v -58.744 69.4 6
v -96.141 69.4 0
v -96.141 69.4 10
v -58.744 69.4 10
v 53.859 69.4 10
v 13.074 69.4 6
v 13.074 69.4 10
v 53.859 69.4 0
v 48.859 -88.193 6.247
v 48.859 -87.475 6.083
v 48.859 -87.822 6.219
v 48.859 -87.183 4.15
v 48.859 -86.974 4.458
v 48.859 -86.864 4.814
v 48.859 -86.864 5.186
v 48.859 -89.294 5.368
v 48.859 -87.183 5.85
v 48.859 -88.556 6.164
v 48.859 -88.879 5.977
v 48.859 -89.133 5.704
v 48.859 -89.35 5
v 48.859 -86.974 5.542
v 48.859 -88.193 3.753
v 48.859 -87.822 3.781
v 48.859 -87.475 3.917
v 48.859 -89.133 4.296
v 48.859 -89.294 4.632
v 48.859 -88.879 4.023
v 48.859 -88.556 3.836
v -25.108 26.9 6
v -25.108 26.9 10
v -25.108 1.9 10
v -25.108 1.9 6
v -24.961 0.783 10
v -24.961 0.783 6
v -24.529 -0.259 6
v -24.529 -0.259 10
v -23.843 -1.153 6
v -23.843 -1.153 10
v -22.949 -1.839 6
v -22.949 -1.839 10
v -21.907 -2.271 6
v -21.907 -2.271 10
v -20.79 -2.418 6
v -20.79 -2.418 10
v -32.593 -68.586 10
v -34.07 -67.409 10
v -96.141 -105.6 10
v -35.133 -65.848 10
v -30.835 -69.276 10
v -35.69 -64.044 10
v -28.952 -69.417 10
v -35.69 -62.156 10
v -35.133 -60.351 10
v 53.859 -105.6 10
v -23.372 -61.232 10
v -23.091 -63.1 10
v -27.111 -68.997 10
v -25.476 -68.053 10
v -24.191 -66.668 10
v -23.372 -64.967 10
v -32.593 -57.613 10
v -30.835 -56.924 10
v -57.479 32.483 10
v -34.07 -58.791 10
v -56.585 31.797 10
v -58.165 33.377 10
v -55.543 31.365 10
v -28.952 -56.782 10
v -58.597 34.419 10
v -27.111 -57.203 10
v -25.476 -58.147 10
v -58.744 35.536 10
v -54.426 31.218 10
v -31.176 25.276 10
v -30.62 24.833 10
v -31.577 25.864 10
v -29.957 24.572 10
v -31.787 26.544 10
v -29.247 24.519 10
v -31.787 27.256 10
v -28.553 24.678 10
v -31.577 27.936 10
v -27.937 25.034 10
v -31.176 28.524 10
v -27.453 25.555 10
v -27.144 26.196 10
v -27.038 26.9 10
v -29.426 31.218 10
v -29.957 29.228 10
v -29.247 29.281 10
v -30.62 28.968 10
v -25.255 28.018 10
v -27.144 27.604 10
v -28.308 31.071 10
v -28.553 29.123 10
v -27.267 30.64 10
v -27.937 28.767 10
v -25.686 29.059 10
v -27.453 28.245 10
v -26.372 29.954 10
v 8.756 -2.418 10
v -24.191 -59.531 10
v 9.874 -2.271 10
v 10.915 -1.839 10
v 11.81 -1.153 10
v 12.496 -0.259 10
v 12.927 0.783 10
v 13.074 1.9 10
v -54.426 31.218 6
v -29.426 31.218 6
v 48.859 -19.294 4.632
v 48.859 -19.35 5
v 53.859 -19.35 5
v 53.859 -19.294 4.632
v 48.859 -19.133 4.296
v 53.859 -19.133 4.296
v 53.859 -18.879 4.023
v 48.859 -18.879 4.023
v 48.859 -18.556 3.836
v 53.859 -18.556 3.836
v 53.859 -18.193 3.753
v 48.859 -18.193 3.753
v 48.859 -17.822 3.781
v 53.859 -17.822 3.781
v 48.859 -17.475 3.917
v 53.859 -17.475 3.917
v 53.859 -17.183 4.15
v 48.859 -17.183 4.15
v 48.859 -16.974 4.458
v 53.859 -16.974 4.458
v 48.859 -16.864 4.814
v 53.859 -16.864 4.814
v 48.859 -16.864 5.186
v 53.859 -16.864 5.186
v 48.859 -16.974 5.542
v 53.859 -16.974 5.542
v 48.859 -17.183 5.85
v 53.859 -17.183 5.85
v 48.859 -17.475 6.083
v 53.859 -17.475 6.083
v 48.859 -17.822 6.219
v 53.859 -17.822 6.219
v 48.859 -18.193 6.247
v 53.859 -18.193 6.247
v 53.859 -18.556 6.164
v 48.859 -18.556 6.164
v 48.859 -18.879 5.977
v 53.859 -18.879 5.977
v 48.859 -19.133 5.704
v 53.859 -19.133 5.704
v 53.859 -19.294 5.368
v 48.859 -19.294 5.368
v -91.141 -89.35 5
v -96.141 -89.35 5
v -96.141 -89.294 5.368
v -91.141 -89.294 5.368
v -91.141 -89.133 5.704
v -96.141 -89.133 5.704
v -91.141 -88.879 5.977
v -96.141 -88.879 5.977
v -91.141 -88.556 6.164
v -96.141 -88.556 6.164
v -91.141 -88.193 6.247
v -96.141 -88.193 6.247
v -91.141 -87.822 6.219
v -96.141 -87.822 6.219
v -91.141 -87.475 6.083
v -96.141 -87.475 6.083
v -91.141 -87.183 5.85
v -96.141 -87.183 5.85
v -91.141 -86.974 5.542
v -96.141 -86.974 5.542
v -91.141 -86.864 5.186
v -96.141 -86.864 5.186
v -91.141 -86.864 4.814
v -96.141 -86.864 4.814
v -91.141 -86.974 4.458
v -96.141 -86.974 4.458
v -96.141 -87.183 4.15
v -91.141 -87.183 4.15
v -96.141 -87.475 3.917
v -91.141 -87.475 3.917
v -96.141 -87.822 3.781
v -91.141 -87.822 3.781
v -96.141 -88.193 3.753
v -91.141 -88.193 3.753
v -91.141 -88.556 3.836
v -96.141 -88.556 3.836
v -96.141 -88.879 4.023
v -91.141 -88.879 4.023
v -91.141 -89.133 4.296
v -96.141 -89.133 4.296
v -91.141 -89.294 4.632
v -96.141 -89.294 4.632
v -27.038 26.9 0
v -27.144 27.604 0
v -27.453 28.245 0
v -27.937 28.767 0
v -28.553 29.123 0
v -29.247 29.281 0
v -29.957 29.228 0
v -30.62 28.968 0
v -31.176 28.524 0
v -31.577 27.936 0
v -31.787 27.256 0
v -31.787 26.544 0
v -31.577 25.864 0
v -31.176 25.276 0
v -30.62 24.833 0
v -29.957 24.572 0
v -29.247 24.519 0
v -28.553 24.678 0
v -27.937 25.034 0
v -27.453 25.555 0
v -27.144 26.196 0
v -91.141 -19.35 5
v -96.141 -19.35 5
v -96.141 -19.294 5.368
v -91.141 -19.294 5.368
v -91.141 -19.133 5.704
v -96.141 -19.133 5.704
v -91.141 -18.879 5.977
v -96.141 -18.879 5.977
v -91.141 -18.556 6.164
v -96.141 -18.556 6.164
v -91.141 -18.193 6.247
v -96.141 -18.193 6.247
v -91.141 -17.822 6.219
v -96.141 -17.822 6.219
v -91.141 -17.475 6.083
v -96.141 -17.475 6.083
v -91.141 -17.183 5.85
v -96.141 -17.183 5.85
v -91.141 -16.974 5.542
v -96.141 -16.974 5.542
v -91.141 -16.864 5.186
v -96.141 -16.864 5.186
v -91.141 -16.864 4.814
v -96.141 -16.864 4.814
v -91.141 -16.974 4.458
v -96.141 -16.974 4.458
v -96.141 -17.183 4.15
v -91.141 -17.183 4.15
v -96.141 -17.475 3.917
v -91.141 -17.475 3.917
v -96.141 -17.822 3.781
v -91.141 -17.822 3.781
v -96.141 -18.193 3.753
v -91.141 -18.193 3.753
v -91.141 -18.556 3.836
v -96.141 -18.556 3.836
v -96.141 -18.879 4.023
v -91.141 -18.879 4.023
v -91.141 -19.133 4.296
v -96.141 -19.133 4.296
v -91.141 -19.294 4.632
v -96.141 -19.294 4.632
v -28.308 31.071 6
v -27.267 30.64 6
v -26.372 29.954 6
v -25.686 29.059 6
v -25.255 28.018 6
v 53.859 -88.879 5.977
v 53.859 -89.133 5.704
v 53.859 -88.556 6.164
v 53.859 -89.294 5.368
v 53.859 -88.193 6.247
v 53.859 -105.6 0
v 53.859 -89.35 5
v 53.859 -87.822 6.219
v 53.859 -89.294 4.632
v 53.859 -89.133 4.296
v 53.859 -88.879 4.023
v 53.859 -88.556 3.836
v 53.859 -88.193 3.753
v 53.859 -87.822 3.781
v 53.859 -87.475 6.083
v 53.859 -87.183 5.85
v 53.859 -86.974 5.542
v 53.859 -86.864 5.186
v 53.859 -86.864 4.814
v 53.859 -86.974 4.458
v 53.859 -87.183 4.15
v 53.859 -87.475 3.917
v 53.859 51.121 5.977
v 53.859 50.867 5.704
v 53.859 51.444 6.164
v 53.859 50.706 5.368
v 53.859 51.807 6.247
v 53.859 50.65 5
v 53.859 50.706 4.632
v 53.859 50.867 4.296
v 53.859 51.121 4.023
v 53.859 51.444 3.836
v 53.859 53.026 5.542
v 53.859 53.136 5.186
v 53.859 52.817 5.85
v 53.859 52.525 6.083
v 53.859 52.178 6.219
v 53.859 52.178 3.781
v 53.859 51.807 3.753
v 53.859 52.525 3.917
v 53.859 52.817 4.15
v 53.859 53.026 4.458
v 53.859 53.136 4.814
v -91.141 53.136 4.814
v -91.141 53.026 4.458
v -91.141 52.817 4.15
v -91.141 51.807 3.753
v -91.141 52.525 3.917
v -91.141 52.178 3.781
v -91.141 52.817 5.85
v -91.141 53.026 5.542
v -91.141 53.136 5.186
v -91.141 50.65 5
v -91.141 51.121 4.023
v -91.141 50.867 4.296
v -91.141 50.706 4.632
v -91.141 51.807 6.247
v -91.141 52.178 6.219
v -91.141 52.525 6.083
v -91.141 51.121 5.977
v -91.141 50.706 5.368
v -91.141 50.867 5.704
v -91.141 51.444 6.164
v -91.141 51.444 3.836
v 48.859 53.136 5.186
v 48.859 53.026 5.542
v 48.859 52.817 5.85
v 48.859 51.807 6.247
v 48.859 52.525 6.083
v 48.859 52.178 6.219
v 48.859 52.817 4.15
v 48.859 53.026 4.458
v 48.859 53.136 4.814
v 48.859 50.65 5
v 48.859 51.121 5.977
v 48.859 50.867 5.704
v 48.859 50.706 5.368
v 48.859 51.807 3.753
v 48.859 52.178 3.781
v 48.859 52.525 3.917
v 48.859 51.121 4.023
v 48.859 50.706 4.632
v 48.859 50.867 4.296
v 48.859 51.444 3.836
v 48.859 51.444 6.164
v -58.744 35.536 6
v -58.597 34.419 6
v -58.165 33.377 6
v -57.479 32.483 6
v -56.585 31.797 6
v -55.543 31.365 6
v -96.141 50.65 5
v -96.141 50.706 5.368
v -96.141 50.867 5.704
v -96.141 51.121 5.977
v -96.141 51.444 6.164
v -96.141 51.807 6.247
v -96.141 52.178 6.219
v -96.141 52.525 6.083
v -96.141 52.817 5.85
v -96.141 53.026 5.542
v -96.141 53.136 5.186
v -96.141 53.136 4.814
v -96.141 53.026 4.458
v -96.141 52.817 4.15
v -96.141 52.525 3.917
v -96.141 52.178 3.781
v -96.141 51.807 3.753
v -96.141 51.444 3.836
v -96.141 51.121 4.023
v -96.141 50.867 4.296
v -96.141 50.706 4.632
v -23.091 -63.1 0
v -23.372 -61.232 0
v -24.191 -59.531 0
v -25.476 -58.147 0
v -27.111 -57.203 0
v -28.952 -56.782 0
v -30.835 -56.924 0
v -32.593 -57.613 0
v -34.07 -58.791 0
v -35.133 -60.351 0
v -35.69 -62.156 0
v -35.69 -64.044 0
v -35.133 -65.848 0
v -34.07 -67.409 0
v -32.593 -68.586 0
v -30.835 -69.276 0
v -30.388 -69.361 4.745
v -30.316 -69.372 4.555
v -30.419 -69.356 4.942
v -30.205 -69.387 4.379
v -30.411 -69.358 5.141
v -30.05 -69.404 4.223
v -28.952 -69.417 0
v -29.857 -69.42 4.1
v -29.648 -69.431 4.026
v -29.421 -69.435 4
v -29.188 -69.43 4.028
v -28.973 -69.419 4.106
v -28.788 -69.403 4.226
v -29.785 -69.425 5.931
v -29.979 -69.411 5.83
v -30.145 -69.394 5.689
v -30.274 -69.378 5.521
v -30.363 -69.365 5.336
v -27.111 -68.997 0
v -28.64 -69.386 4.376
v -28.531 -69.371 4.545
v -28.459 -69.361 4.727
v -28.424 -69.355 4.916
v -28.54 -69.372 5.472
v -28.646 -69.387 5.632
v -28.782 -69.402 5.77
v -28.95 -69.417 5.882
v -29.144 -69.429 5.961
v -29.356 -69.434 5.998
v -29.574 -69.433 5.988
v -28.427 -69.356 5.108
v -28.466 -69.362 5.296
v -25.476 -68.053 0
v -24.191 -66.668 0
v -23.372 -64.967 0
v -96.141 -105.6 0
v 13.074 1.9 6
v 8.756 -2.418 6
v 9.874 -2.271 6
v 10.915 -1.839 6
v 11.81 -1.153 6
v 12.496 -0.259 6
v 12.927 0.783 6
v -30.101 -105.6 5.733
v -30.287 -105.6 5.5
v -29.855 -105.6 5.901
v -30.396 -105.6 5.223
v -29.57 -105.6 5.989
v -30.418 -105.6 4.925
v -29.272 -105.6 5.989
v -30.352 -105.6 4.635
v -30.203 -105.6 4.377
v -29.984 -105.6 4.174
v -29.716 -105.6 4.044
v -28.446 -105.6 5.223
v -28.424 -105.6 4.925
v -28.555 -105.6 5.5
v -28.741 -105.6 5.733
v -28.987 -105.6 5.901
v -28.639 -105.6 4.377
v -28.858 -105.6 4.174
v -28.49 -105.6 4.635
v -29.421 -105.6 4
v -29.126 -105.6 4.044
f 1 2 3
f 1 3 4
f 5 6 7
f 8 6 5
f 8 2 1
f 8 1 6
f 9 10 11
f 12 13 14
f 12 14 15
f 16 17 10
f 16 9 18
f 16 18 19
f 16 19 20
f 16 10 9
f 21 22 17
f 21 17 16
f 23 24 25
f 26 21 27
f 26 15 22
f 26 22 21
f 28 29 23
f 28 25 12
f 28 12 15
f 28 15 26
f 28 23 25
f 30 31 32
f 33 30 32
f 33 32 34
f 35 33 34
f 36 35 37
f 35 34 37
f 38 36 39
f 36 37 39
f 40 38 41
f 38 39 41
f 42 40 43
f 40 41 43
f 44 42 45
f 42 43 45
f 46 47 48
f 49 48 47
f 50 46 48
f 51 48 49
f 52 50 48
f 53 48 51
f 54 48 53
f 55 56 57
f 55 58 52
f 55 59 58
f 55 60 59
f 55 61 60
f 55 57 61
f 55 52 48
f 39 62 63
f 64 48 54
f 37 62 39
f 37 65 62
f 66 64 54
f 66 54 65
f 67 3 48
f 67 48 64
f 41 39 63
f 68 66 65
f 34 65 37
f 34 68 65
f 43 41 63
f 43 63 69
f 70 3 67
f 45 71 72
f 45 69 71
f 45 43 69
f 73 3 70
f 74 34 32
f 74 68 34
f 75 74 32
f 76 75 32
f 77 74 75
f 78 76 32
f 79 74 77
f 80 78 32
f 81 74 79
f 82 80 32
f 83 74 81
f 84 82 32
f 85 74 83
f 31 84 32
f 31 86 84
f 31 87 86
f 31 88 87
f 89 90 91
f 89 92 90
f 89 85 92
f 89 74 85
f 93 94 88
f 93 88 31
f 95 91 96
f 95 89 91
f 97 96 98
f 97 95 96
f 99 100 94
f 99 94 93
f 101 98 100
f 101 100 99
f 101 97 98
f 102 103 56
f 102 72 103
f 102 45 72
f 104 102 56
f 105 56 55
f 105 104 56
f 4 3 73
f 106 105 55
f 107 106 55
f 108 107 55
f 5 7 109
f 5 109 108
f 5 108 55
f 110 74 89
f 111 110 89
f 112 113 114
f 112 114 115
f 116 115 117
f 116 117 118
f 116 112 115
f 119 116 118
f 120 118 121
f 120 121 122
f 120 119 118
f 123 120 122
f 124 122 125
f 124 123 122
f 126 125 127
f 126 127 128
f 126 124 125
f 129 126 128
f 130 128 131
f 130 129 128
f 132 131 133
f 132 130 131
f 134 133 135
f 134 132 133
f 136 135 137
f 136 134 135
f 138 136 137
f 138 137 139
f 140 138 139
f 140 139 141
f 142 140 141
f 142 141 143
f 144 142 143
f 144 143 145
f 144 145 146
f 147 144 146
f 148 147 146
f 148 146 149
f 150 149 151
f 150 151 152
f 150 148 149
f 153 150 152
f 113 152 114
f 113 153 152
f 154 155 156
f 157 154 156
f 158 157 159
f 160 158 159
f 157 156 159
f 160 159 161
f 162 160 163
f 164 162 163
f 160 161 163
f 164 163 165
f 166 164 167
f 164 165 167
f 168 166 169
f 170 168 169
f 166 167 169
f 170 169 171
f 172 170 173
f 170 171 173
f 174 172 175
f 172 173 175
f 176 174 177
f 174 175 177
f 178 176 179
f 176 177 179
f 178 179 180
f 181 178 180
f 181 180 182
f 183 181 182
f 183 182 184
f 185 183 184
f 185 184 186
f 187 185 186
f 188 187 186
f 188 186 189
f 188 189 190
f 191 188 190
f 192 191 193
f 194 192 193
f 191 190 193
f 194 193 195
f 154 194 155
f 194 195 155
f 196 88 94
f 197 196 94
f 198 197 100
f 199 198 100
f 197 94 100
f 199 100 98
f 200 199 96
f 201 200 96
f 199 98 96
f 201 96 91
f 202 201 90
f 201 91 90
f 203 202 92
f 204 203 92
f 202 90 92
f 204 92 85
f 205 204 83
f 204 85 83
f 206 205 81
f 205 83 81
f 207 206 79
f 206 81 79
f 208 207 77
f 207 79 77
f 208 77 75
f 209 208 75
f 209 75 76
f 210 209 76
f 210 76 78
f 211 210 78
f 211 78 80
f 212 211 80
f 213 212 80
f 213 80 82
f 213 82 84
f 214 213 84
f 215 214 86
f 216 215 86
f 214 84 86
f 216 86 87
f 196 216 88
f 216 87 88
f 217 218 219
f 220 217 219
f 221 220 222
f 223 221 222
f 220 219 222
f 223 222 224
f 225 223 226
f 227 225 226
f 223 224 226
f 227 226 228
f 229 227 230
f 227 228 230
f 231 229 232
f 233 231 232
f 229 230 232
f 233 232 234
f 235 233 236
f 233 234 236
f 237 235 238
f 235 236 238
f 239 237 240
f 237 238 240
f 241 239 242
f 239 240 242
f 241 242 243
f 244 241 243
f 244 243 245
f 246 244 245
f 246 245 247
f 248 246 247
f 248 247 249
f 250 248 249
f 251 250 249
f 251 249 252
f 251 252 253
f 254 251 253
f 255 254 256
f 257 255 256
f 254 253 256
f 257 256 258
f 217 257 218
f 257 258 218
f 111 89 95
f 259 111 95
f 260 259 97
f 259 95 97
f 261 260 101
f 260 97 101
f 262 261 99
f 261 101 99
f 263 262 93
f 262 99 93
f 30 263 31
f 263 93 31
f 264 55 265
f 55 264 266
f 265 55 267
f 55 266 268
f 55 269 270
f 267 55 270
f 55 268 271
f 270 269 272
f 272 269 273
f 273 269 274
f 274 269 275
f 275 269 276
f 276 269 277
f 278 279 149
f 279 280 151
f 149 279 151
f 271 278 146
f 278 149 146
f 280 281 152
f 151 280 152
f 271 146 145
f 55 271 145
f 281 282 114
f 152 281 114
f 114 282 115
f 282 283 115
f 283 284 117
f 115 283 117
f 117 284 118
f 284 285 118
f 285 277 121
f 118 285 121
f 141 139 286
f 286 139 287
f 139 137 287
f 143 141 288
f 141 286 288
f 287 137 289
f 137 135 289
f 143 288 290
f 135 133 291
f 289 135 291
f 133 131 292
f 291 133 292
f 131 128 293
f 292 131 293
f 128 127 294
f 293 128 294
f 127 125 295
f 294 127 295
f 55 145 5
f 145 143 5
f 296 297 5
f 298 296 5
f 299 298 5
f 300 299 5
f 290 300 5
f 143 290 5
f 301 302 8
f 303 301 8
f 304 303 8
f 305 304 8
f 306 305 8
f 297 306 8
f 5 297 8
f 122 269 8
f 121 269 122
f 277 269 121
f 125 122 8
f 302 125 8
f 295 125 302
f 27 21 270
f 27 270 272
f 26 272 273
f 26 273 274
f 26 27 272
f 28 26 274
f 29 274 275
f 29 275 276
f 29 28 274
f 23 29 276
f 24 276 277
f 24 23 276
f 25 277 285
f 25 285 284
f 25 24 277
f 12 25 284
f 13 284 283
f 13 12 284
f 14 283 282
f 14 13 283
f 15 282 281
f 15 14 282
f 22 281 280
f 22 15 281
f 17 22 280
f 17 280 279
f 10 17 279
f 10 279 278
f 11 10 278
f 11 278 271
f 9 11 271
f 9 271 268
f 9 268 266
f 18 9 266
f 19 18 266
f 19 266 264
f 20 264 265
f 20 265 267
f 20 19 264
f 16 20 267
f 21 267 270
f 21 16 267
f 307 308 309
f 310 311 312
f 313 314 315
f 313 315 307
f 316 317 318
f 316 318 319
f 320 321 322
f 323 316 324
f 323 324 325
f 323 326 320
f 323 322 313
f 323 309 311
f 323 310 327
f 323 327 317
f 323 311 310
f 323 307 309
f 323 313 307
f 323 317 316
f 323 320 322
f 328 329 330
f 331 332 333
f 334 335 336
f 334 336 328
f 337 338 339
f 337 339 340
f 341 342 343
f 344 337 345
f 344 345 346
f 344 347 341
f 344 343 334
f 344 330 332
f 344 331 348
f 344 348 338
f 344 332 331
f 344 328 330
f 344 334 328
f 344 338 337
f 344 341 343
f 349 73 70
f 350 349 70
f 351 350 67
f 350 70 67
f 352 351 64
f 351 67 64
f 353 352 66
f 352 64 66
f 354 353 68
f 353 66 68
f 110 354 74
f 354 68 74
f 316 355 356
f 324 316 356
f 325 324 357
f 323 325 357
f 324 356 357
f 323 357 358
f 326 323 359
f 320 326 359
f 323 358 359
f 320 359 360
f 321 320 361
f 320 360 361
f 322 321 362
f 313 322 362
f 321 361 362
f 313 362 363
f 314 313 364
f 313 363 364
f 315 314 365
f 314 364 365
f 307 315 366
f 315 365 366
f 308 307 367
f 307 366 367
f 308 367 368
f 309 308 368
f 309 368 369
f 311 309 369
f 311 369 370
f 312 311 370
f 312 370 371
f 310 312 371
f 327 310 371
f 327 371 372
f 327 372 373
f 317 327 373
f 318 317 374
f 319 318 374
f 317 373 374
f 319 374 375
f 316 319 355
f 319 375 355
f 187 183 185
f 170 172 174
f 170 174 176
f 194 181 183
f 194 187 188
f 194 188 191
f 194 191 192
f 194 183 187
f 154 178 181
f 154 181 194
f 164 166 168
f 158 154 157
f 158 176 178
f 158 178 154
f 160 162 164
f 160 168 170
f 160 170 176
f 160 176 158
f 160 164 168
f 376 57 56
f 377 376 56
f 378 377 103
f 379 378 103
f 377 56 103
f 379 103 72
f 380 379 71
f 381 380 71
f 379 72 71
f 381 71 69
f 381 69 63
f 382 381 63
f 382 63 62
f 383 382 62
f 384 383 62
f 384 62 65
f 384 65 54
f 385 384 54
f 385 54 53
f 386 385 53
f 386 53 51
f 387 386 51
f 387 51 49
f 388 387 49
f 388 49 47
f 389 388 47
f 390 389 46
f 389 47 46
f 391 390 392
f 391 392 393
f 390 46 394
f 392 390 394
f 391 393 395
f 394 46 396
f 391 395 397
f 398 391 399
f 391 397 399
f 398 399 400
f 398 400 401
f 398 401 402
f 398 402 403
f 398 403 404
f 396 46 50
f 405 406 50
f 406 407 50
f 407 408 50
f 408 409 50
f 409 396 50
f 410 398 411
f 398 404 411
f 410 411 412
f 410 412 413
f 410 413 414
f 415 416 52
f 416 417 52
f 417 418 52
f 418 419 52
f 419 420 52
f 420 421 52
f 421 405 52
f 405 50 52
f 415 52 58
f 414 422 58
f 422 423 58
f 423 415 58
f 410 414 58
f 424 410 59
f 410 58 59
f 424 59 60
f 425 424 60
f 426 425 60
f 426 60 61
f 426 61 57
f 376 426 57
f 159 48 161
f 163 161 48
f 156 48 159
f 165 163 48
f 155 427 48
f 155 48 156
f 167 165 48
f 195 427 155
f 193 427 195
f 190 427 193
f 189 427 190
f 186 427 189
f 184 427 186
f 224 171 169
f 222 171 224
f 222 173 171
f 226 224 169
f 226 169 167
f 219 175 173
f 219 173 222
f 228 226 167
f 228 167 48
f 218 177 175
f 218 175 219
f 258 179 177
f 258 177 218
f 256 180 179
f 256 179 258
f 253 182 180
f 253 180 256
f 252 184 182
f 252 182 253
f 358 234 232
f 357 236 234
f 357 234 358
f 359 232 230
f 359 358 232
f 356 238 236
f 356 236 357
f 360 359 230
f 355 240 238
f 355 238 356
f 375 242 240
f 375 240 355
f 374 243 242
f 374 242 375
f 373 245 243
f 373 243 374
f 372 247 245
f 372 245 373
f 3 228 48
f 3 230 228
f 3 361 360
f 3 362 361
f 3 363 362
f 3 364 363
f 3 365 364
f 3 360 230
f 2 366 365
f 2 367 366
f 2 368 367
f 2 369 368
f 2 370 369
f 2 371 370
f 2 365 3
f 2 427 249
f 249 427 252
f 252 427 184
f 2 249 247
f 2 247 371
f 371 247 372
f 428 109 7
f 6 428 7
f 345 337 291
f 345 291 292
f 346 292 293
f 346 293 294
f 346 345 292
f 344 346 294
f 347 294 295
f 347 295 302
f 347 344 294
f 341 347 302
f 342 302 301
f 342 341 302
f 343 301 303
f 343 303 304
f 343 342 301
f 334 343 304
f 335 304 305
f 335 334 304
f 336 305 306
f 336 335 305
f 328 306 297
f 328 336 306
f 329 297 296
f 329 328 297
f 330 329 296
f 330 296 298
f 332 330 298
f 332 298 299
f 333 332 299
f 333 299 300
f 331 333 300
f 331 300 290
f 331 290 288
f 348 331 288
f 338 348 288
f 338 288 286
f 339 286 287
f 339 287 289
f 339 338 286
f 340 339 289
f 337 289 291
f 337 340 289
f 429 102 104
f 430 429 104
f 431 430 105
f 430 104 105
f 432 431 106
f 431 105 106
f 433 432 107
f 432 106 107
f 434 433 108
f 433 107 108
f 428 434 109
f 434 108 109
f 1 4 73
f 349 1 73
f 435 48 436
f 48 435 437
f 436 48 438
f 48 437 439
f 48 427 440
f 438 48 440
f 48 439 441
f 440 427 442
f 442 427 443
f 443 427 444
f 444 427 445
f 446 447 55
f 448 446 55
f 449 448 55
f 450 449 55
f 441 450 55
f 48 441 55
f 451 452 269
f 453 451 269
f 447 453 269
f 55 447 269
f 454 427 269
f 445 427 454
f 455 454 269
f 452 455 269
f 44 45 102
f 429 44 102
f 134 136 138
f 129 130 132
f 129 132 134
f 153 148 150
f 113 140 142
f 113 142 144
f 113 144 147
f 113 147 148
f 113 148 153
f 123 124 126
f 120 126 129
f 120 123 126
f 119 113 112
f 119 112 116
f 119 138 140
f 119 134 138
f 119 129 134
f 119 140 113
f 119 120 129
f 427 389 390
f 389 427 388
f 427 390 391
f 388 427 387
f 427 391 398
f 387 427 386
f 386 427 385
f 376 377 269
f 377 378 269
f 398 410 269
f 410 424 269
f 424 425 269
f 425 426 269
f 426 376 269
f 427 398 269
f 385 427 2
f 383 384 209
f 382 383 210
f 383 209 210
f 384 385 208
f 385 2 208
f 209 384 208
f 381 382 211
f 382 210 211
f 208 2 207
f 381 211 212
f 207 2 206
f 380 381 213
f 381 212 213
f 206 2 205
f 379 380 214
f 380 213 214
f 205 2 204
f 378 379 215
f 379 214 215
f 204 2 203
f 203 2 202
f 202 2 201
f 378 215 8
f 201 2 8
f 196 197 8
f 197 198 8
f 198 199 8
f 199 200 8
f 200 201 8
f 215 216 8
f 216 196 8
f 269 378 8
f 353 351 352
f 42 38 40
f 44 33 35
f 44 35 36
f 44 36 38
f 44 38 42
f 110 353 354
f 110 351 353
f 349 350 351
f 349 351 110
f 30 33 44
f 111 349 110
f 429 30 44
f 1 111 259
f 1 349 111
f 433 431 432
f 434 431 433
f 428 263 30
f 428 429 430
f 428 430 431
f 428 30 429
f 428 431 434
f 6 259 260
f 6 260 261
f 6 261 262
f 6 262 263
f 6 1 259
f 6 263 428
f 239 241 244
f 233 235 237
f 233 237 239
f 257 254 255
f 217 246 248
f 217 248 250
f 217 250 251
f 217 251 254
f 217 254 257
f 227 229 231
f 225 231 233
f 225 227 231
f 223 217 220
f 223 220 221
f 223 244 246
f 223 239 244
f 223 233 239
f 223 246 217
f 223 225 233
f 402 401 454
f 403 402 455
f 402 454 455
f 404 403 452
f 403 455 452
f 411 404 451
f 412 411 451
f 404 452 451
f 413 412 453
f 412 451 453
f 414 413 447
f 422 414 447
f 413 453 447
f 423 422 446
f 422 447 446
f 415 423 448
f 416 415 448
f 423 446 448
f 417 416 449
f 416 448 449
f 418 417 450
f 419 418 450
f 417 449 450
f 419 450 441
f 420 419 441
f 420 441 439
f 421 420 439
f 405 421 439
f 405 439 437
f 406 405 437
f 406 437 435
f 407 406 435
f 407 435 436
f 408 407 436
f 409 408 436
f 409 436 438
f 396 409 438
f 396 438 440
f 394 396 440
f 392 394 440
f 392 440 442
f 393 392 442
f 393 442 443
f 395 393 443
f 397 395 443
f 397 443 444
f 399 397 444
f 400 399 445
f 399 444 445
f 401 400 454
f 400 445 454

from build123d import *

# Parameters (mm, degrees)
SKIZZE1_W                       = 150
SKIZZE1_H                       = 175
AUFSATZ_LINEAR_AUSTRAGEN1_DEPTH = 10
SKIZZE2_R                       = 2.3876
SKIZZE2_R_2                     = 6.335
SCHNITT_LINEAR_AUSTRAGEN1_DEPTH = 10
SCHNITT_LINEAR_AUSTRAGEN2_DEPTH = 4
SKIZZE4_R                       = 1.25
SCHNITT_LINEAR_AUSTRAGEN3_DEPTH = 5
SCHNITT_LINEAR_START            = -5
SKIZZE6_R                       = 1.25
SCHNITT_LINEAR_AUSTRAGEN4_DEPTH = 5
SKIZZE7_R                       = 1
SCHNITT_LINEAR_AUSTRAGEN5_DEPTH = 40


with BuildPart() as part:
    # Skizze1 → Aufsatz-Linear austragen1 (new body)
    with BuildSketch(Plane.XY):
        with Locations((-21.140947697, -18.099765847)):
            Rectangle(SKIZZE1_W, SKIZZE1_H)
    extrude(amount=AUFSATZ_LINEAR_AUSTRAGEN1_DEPTH)

    # Skizze2 → Schnitt-Linear austragen1 (cut)
    with BuildSketch(Plane.XY.offset(10)):
        with Locations((-29.425704113, 26.900234153)):
            Circle(SKIZZE2_R)
        with Locations((-29.425704113, -63.099765847)):
            Circle(SKIZZE2_R_2)
    extrude(amount=-SCHNITT_LINEAR_AUSTRAGEN1_DEPTH, mode=Mode.SUBTRACT)

    # Skizze3 → Schnitt-Linear austragen2 (cut)
    with BuildSketch(Plane.XY.offset(10)):
        with BuildLine():
            Line((-54.425704113, 31.218234153), (-29.425704113, 31.218234153))
            ThreePointArc((-29.425704113, 31.218234153), (-26.372417032, 29.953521235), (-25.107704113, 26.900234153))
            Line((-25.107704113, 26.900234153), (-25.107704113, 1.900234153))
            ThreePointArc((-25.107704113, 1.900234153), (-23.842991195, -1.153052928), (-20.789704113, -2.417765847))
            Line((-20.789704113, -2.417765847), (8.756295887, -2.417765847))
            ThreePointArc((8.756295887, -2.417765847), (11.809582968, -1.153052928), (13.074295887, 1.900234153))
            Line((13.074295887, 1.900234153), (13.074295887, 69.400234153))
            Line((13.074295887, 69.400234153), (-58.743704113, 69.400234153))
            Line((-58.743704113, 69.400234153), (-58.743704113, 35.536234153))
            ThreePointArc((-58.743704113, 35.536234153), (-57.478991195, 32.482947072), (-54.425704113, 31.218234153))
        make_face()
    extrude(amount=-SCHNITT_LINEAR_AUSTRAGEN2_DEPTH, mode=Mode.SUBTRACT)

    # Skizze4 → Schnitt-Linear austragen3 (cut)
    with BuildSketch(Plane.ZY.offset(96.140947697)):
        with Locations(Location((5, 51.900234153, 0), (0, 0, 270))):
            Circle(SKIZZE4_R)
        with Locations(Location((5, -18.099765847, 0), (0, 0, 270))):
            Circle(SKIZZE4_R)
        with Locations(Location((5, -88.099765847, 0), (0, 0, 270))):
            Circle(SKIZZE4_R)
    extrude(amount=-SCHNITT_LINEAR_AUSTRAGEN3_DEPTH, mode=Mode.SUBTRACT)

    # Skizze6 → Schnitt-Linear austragen4 (cut)
    with BuildSketch(Plane(origin=(53.859052303, 0, 0), x_dir=(0, 0, -1), z_dir=(1, 0, 0)).offset(SCHNITT_LINEAR_START)):
        with Locations(Location((-5, 51.900234153, 0), (0, 0, 270))):
            Circle(SKIZZE6_R)
        with Locations(Location((-5, -18.099765847, 0), (0, 0, 270))):
            Circle(SKIZZE6_R)
        with Locations(Location((-5, -88.099765847, 0), (0, 0, 270))):
            Circle(SKIZZE6_R)
    extrude(amount=SCHNITT_LINEAR_AUSTRAGEN4_DEPTH, mode=Mode.SUBTRACT)

    # Skizze7 → Schnitt-Linear austragen5 (cut)
    with BuildSketch(Plane.XZ.offset(105.599765847)):
        with Locations(Location((-29.420947697, 5, 0), (0, 0, 270))):
            Circle(SKIZZE7_R)
    extrude(amount=-SCHNITT_LINEAR_AUSTRAGEN5_DEPTH, mode=Mode.SUBTRACT)


solid = part.part
